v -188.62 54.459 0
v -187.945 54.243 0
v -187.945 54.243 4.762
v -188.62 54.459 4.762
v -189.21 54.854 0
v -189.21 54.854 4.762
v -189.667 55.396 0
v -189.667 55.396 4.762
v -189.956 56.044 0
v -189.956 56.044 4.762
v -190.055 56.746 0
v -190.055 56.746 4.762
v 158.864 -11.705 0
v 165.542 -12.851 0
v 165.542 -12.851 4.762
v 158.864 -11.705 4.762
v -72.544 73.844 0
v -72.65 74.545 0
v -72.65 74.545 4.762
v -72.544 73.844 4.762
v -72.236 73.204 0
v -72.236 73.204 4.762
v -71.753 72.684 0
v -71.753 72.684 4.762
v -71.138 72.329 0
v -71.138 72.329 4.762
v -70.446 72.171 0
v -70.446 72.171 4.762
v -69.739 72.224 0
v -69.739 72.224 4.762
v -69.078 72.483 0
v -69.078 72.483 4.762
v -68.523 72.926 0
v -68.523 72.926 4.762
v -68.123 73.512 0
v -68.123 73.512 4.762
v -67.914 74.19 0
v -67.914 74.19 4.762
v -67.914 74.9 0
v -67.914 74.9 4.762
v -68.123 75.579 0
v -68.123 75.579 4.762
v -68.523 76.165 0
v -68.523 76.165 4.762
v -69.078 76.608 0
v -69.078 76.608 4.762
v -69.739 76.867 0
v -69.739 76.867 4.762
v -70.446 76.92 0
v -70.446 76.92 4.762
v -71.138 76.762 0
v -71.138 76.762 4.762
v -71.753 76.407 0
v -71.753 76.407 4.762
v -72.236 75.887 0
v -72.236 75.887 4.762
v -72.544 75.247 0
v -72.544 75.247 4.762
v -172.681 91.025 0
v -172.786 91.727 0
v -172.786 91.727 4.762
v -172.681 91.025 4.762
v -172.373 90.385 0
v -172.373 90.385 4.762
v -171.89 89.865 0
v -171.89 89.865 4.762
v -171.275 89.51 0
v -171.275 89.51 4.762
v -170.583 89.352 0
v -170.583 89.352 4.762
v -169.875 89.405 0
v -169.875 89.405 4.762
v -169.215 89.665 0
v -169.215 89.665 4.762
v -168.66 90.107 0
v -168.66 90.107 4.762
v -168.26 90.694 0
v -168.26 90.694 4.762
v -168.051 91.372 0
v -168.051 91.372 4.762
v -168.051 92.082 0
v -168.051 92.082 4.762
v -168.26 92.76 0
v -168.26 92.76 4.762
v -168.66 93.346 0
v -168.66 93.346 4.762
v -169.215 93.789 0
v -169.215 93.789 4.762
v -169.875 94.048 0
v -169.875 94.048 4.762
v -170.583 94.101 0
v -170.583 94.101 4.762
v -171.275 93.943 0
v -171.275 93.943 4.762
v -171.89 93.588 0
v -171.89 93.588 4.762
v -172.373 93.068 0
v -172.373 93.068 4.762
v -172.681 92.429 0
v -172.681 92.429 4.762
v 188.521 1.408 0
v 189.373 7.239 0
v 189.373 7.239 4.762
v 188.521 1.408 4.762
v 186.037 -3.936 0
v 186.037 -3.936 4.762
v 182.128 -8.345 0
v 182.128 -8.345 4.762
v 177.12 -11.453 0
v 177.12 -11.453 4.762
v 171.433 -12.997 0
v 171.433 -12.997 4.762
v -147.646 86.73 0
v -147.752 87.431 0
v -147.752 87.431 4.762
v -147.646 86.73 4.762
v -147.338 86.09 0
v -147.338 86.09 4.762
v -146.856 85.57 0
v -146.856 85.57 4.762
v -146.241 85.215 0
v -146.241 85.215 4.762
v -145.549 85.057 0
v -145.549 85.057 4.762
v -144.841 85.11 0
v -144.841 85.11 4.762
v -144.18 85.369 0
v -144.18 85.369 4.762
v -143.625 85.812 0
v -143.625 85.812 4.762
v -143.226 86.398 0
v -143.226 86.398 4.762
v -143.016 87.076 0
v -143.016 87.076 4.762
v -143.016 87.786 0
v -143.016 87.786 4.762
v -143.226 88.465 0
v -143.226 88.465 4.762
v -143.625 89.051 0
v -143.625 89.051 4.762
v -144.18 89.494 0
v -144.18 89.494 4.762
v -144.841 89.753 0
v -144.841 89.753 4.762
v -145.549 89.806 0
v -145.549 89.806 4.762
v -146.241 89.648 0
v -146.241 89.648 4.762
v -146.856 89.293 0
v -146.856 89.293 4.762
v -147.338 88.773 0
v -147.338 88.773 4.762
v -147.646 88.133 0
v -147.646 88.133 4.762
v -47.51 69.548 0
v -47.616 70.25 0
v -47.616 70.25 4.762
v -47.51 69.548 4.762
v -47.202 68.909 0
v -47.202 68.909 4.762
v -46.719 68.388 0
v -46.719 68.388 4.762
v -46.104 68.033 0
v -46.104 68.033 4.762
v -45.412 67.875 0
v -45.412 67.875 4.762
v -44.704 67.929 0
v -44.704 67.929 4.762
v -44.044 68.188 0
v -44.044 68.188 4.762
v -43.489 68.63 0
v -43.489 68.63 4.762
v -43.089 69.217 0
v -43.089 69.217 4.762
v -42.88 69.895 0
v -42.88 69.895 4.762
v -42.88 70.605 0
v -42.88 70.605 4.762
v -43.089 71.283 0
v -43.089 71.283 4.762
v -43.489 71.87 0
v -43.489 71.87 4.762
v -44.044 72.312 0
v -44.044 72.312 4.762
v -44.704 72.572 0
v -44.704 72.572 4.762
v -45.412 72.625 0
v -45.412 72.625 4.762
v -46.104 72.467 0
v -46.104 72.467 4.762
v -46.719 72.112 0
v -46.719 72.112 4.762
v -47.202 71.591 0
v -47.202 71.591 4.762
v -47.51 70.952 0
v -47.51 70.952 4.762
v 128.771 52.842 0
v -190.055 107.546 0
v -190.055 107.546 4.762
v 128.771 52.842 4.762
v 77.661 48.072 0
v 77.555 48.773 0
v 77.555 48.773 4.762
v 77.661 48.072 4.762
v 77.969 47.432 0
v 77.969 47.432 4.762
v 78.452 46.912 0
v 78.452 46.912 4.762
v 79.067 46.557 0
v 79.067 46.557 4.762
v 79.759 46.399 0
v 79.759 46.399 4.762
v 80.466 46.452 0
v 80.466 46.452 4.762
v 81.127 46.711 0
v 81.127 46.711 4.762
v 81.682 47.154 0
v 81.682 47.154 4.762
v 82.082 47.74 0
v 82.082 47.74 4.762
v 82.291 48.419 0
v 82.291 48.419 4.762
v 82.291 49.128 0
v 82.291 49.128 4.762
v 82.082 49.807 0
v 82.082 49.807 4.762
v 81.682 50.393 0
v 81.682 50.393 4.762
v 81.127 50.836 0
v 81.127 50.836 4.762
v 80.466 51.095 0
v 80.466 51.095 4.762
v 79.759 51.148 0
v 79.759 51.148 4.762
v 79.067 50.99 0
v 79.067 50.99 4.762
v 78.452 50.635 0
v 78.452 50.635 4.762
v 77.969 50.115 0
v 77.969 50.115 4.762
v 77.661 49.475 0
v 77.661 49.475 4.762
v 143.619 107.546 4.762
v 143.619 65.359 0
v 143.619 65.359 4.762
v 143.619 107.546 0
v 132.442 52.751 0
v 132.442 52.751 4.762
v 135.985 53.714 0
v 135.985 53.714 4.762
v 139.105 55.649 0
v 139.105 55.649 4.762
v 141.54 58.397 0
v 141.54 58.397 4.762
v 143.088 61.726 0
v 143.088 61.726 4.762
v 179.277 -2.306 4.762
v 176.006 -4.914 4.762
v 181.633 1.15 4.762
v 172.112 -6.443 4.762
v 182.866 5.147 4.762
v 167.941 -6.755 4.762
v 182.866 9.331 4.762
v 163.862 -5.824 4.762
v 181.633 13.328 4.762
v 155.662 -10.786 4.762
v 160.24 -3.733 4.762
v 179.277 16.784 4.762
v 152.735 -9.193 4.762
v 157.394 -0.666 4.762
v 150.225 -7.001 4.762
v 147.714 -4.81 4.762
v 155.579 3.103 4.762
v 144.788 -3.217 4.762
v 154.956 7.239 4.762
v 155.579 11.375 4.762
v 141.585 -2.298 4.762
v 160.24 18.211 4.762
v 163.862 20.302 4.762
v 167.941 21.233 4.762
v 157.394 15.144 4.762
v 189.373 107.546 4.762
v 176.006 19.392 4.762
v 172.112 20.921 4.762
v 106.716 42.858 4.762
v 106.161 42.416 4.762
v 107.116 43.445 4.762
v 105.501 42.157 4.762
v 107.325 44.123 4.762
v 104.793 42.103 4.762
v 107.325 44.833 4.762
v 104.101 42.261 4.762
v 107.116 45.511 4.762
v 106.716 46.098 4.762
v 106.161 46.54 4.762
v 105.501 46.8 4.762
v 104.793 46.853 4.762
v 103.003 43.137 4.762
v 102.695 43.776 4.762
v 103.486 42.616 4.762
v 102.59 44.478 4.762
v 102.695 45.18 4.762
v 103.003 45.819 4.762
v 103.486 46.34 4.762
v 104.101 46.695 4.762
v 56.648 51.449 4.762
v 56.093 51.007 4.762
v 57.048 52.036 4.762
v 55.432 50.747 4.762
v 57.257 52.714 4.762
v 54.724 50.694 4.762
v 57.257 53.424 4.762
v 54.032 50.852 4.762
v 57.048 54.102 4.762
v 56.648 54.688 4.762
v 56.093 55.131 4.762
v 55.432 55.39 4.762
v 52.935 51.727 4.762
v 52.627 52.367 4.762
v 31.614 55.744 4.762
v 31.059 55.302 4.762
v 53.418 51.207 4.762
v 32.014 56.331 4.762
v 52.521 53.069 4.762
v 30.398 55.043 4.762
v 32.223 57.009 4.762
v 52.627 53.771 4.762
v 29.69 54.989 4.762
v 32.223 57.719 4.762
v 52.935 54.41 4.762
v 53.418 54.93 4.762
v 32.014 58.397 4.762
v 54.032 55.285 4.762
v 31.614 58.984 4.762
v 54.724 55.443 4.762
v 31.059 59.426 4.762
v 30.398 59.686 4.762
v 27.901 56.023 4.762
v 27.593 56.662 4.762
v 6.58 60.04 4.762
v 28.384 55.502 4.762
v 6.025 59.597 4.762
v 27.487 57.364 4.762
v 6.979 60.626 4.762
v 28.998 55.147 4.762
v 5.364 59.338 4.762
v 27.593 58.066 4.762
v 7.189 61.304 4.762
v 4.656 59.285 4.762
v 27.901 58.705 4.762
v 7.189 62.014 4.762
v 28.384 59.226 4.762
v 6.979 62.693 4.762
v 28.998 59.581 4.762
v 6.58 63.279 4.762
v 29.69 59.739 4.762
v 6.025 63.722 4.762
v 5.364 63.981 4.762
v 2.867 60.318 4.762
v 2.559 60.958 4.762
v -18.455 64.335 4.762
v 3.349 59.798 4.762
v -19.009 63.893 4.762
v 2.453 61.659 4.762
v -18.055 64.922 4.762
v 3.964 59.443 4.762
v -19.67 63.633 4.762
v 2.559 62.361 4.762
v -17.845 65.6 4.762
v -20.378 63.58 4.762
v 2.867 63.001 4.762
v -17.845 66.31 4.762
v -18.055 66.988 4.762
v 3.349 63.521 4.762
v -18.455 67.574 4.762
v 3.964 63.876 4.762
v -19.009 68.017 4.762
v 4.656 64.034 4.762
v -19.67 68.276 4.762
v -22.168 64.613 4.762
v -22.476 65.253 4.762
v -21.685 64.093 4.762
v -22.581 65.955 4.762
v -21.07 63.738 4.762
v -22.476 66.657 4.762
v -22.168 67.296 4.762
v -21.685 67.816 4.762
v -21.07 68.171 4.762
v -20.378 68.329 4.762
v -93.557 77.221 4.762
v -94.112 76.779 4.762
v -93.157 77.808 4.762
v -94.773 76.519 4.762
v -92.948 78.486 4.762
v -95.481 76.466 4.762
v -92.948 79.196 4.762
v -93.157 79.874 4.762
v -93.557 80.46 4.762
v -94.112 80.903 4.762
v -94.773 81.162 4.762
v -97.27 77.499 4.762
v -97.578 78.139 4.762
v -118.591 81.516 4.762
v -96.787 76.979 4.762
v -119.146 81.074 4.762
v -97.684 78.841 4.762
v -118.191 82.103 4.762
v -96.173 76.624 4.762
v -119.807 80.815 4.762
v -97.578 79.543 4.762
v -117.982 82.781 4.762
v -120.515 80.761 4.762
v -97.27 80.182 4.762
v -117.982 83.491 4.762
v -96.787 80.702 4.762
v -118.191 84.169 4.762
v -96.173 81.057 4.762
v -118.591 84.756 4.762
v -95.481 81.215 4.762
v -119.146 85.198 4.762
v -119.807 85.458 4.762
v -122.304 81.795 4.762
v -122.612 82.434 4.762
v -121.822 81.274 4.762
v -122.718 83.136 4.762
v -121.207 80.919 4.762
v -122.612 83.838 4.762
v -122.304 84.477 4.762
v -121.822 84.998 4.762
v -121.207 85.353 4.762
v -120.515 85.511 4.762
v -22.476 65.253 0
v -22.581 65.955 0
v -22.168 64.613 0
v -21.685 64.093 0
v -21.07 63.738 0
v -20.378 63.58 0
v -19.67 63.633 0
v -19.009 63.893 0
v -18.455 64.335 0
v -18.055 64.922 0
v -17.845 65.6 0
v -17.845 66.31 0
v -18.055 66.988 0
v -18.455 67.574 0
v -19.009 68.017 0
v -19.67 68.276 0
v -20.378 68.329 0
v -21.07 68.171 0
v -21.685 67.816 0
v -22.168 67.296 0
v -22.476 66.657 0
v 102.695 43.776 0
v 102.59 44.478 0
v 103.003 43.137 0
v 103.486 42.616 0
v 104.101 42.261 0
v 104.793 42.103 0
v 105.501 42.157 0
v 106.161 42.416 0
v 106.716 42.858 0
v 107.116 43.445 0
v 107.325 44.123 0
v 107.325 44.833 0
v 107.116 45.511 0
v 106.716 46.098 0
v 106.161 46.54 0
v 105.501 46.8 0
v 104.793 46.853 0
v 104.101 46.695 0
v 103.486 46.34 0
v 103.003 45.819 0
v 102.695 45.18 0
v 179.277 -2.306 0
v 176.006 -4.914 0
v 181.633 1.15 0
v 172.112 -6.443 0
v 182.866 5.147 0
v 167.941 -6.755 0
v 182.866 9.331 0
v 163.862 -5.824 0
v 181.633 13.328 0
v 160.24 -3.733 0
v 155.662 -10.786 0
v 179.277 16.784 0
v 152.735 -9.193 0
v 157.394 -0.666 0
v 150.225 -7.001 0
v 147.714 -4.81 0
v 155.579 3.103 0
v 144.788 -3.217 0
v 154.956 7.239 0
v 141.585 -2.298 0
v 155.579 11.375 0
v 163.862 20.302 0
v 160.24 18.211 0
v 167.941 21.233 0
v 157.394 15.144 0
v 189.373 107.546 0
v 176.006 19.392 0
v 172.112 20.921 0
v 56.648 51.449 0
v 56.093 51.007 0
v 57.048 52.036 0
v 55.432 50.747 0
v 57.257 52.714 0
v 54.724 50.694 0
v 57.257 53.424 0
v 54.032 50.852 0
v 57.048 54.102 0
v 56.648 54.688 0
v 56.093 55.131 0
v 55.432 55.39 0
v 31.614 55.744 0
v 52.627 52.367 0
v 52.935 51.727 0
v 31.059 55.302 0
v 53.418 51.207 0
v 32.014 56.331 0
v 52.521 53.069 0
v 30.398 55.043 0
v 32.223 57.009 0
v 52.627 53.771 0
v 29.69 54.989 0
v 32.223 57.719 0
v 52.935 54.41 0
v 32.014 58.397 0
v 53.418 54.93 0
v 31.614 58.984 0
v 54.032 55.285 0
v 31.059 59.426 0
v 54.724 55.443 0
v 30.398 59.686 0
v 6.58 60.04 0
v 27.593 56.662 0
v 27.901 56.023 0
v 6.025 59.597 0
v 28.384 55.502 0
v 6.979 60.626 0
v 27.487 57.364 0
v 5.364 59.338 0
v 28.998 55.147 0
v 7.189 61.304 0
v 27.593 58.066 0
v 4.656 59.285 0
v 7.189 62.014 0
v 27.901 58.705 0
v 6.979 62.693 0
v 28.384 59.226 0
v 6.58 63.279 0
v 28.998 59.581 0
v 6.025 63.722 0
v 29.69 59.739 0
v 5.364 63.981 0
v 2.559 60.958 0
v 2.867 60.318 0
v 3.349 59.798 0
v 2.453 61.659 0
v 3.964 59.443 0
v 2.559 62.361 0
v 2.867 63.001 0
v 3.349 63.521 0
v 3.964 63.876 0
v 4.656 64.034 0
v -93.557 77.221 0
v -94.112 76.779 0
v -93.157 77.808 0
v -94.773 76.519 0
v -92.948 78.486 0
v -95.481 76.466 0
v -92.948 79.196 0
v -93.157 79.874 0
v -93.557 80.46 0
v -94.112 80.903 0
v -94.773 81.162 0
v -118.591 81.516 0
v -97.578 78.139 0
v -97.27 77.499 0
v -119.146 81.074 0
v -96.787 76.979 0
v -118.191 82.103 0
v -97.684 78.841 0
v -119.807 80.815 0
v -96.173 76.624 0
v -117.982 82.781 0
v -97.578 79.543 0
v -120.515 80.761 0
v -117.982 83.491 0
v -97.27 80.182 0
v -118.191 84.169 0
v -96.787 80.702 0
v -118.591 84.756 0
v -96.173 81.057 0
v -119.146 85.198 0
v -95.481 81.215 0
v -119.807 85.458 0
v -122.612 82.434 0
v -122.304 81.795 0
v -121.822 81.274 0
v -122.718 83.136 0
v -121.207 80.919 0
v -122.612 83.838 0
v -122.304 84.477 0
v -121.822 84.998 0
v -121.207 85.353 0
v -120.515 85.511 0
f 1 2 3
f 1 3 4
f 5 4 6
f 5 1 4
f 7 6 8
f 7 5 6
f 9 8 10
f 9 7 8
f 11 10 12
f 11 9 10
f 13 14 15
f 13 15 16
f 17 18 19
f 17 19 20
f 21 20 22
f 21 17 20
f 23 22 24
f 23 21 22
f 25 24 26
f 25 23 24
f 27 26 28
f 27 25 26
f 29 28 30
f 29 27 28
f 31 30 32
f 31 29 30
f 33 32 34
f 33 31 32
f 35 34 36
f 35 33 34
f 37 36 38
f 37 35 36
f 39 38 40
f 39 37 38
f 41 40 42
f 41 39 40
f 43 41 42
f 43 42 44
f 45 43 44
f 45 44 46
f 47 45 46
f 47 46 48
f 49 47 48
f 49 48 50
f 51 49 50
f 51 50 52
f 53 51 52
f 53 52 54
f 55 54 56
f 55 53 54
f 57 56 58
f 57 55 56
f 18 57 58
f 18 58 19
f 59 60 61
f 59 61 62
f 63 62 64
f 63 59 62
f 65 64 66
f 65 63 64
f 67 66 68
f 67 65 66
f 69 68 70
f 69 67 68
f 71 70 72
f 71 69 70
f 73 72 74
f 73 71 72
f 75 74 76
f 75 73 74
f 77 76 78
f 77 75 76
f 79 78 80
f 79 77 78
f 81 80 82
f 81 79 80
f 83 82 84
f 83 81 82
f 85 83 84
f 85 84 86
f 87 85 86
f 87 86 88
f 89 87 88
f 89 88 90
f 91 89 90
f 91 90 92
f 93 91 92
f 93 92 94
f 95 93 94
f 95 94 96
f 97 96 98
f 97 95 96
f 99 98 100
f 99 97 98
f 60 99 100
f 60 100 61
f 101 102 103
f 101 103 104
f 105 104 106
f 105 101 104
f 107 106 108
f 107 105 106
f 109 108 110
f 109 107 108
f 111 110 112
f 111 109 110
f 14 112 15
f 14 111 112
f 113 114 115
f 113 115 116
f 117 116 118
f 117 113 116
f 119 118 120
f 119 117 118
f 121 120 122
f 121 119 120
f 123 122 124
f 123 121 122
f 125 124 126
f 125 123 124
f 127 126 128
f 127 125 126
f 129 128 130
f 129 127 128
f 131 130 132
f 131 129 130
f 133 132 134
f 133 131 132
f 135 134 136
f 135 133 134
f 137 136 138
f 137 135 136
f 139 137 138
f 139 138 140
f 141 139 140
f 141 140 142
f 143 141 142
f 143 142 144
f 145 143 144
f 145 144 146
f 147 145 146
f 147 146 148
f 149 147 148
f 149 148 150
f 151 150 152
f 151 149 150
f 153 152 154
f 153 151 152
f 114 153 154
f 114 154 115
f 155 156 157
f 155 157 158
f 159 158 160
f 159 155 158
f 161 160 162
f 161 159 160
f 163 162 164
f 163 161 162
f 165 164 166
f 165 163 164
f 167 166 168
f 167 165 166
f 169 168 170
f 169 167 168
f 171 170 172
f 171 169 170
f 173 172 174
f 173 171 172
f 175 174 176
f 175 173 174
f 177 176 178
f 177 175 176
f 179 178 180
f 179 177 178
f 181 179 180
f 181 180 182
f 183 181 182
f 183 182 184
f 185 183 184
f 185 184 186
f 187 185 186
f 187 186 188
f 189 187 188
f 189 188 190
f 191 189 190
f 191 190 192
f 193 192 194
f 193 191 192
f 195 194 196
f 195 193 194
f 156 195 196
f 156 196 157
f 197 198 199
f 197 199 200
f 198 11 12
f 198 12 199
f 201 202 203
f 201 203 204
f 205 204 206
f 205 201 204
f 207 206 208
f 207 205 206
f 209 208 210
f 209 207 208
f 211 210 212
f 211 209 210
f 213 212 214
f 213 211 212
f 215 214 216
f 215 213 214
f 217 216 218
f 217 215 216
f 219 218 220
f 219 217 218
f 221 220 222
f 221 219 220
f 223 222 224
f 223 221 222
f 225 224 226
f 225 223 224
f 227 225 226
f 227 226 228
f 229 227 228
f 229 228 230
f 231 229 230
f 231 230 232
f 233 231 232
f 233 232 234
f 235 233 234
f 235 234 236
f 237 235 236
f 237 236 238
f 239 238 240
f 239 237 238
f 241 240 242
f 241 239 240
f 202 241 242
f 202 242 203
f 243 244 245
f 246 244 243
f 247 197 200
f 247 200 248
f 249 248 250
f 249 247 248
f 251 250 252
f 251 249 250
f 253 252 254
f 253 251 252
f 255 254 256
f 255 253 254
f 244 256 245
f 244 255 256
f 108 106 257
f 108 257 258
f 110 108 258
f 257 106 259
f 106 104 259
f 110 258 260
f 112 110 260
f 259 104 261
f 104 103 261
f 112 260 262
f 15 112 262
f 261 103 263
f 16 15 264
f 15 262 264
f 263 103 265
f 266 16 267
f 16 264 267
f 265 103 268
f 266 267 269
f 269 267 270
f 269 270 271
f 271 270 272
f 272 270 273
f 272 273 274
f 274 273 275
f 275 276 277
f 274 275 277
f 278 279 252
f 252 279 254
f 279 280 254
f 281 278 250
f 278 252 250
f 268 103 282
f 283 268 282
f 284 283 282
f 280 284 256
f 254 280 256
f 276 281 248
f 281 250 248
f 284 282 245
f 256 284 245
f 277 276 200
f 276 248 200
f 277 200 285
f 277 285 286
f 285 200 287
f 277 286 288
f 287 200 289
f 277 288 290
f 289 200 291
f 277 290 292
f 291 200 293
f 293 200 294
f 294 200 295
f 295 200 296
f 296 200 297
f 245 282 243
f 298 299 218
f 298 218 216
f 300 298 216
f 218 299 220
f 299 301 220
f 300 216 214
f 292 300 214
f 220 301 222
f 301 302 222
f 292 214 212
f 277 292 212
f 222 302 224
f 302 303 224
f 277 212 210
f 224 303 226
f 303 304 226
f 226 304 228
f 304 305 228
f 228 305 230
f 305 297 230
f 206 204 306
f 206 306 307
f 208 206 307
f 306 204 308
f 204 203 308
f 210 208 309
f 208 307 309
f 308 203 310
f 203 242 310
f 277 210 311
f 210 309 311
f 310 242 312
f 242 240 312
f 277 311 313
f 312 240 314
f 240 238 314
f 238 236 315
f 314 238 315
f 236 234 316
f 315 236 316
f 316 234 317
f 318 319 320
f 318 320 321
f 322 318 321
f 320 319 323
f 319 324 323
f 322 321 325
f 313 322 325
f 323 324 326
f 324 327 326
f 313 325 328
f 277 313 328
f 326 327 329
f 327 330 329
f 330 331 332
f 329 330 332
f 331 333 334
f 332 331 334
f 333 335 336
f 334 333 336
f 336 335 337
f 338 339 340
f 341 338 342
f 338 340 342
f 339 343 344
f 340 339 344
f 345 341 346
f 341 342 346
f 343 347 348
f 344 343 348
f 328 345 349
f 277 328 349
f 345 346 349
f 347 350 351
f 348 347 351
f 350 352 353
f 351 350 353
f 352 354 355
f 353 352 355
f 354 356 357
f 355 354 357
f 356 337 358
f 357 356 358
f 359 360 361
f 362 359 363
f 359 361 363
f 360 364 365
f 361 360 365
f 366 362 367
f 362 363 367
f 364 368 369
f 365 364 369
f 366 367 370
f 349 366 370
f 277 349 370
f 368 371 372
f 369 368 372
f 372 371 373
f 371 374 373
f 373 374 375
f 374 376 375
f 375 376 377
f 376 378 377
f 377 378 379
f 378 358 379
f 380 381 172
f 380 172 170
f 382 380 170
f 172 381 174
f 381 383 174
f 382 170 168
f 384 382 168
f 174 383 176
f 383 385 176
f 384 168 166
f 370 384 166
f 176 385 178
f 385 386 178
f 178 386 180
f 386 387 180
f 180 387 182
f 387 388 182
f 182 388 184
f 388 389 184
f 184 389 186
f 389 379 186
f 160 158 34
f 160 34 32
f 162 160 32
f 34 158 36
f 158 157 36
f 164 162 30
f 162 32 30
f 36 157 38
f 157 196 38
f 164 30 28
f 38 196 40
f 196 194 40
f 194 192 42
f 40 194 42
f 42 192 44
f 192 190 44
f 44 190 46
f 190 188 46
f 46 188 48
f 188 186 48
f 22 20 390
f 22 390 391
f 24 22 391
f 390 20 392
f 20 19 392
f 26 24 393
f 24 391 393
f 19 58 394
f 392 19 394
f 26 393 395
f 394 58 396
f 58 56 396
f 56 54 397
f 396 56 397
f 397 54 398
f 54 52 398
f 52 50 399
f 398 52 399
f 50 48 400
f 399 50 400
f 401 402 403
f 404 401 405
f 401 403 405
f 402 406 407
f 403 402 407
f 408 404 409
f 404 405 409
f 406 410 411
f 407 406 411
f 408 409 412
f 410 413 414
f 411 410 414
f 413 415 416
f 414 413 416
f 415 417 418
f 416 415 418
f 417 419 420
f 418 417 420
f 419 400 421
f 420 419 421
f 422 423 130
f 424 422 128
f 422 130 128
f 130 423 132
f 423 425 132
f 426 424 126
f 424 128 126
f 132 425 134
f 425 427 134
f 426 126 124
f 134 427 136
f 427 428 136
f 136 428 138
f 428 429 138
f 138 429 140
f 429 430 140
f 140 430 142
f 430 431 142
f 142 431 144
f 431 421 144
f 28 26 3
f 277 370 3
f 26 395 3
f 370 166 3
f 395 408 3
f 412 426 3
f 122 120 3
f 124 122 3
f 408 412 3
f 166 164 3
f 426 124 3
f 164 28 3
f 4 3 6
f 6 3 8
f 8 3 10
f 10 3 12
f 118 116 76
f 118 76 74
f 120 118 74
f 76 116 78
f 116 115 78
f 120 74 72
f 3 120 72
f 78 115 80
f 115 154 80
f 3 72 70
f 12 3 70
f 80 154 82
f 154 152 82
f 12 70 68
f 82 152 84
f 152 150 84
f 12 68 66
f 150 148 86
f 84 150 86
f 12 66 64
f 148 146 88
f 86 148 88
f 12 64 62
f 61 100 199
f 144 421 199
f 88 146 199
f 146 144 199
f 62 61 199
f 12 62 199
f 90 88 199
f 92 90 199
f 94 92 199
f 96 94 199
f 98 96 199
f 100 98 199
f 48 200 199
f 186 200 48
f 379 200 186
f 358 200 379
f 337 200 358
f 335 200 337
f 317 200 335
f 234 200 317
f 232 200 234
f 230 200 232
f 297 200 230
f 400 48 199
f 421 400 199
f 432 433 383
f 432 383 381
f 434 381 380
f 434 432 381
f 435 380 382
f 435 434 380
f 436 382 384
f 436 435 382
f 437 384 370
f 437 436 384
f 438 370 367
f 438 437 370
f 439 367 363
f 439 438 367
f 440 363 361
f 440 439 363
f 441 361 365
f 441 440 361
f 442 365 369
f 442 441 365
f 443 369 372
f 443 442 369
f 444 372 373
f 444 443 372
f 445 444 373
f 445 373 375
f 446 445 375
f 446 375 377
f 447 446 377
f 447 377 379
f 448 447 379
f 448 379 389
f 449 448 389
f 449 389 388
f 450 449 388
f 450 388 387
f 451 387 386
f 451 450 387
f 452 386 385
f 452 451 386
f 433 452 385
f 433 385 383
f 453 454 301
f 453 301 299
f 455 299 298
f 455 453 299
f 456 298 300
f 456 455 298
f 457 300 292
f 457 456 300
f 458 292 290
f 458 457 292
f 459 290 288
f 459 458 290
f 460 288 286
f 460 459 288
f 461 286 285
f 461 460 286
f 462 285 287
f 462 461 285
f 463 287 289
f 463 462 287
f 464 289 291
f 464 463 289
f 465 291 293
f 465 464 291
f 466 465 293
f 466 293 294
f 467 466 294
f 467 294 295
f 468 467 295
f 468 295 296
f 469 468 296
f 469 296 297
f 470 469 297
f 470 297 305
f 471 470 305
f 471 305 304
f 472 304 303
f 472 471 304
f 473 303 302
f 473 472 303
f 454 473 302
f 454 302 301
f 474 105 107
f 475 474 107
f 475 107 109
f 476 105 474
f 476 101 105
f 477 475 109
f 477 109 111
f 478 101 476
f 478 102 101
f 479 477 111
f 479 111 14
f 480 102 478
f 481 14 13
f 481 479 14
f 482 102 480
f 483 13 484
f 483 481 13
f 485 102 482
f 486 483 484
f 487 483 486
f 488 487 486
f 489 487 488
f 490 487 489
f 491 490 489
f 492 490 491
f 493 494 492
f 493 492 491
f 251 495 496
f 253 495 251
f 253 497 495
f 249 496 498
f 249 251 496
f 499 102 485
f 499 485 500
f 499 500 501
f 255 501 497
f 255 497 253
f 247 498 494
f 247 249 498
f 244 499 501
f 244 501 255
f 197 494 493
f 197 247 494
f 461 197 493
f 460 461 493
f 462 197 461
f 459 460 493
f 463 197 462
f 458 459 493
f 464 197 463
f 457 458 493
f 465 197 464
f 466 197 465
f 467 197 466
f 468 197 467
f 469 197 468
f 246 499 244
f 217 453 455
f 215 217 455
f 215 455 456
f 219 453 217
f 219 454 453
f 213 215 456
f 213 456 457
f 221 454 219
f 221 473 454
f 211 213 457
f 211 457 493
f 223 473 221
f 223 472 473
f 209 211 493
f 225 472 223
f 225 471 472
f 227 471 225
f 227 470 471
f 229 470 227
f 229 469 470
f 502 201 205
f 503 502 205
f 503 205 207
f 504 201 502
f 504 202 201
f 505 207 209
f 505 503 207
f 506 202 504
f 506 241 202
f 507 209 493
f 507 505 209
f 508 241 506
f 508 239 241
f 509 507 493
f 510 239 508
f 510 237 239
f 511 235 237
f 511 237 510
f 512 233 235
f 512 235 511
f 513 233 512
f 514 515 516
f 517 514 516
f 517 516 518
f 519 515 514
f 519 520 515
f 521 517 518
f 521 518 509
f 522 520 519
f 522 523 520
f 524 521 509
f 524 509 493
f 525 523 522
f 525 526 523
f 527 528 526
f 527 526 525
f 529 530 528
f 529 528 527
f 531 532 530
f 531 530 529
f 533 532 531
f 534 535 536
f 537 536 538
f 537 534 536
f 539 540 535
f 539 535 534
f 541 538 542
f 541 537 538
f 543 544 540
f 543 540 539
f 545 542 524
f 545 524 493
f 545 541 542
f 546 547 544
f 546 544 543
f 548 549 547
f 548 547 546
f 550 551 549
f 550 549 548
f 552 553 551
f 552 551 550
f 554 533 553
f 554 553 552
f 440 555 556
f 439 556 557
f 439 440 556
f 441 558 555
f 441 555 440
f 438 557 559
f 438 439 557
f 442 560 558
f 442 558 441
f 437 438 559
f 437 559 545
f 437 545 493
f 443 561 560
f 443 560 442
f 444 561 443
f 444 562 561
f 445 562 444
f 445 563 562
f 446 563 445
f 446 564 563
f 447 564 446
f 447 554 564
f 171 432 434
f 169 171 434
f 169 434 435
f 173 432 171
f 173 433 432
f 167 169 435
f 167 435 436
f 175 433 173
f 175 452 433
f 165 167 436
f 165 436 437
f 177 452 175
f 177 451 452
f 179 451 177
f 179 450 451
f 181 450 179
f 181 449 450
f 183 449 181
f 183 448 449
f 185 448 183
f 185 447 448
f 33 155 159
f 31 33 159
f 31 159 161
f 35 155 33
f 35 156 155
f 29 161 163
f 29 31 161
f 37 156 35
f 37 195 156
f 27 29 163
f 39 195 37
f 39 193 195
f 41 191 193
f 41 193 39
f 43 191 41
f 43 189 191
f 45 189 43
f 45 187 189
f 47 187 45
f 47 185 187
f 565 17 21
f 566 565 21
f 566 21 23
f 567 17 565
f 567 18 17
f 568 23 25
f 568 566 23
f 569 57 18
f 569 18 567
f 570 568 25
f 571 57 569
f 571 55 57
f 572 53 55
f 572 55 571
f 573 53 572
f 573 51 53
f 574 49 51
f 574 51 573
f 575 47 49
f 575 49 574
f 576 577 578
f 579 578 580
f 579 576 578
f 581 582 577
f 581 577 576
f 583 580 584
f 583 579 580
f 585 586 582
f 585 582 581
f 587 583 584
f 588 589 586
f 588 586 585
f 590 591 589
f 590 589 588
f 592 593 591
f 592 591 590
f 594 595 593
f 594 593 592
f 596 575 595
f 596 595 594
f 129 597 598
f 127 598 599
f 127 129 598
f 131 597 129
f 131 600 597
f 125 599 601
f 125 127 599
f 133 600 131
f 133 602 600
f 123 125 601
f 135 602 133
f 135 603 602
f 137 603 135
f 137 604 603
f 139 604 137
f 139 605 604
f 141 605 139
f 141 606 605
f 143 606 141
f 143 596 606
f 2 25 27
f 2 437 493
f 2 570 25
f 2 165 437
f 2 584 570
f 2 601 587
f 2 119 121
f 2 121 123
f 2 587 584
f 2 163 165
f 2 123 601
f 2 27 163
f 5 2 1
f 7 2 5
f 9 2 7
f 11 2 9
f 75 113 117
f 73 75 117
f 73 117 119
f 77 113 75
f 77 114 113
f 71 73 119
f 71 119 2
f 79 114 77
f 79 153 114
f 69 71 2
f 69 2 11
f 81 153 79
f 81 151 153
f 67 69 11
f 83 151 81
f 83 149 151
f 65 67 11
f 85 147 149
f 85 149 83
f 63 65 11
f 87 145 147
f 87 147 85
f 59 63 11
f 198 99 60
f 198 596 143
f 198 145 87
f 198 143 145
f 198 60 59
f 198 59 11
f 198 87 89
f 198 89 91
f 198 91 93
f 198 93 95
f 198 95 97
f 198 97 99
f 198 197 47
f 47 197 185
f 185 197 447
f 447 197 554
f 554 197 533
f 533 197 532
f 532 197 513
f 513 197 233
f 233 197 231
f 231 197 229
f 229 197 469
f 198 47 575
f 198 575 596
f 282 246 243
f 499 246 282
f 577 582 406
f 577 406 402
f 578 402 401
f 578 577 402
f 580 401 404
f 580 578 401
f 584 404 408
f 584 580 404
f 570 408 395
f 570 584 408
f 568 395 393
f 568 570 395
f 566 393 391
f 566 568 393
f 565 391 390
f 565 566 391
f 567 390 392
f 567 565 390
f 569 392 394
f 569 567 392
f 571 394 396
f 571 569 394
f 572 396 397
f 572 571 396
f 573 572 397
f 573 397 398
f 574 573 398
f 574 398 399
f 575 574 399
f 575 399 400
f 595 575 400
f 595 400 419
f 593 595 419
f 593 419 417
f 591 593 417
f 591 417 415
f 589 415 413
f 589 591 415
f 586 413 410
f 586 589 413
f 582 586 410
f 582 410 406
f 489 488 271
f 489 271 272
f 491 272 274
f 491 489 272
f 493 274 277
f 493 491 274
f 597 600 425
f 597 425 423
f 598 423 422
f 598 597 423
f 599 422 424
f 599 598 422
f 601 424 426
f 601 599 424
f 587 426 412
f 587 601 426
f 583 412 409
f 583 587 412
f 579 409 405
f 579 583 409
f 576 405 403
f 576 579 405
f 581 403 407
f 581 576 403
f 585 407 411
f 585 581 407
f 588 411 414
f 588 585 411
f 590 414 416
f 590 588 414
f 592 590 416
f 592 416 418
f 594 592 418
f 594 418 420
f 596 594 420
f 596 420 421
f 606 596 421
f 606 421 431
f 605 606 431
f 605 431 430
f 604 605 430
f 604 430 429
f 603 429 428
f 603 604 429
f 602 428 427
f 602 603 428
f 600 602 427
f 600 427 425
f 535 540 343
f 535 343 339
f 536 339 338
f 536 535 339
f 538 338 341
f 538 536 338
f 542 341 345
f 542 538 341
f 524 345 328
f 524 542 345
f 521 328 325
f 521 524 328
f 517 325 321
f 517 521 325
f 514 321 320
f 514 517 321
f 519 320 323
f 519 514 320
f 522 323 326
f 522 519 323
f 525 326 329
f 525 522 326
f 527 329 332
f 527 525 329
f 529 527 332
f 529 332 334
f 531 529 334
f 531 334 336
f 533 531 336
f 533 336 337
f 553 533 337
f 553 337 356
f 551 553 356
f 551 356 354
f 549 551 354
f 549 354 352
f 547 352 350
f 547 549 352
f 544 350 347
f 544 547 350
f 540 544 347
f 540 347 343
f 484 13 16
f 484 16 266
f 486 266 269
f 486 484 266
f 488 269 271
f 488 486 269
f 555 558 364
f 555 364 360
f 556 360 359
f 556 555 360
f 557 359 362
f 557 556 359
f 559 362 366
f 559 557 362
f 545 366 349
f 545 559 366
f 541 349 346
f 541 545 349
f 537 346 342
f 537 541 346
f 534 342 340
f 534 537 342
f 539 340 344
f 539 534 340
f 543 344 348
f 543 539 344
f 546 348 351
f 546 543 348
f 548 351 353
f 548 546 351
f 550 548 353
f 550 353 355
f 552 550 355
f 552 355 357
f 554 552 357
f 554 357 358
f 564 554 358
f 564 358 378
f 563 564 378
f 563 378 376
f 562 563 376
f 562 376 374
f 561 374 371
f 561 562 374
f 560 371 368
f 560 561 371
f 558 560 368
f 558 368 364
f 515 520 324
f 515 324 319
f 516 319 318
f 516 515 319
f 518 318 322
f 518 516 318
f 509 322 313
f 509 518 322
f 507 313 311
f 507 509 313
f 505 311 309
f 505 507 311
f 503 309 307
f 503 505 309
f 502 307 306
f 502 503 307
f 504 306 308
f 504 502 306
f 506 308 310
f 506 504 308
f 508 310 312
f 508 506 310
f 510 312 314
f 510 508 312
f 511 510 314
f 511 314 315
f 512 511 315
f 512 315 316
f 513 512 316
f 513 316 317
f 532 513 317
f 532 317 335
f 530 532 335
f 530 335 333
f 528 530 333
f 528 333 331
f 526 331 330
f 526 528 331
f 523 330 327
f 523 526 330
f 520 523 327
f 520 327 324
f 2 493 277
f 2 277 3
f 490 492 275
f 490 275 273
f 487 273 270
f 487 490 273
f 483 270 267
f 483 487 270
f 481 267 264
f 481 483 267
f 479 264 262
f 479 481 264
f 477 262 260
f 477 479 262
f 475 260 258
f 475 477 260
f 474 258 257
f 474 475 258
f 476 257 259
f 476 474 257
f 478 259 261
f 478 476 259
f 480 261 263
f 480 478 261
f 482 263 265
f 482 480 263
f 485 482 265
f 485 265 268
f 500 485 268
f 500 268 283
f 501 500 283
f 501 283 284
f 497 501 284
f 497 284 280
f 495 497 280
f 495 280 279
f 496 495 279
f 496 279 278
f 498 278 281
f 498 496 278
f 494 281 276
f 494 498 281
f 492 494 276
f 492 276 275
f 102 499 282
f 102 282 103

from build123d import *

# Parameters (mm, degrees)
SKETCH1_R           = 14.0335
SKETCH1_R_2         = 2.38125
BOSS_EXTRUDE1_DEPTH = 4.7625
CUT_EXTRUDE1_DEPTH  = 219.425881909


with BuildPart() as part:
    # Sketch1 → Boss-Extrude1 (new body)
    with BuildSketch(Plane.XY):
        with BuildLine():
            Line((165.542350471, -12.850928795), (158.864493489, -11.70515089))
            ThreePointArc((158.864493489, -11.70515089), (154.154566121, -10.06953751), (150.224583517, -7.001332225))
            ThreePointArc((150.224583517, -7.001332225), (146.294597206, -3.933124046), (141.584665397, -2.297509122))
            Line((141.584665397, -2.297509122), (-187.944818486, 54.242725653))
            ThreePointArc((-187.944818486, 54.242725653), (-189.457270687, 55.108983561), (-190.055285337, 56.746143572))
            Line((-190.055285337, 56.746143572), (-190.055285337, 107.546143572))
            Line((-190.055285337, 107.546143572), (128.771239178, 52.842308466))
            ThreePointArc((128.771239178, 52.842308466), (139.104704977, 55.649471309), (143.618904922, 65.359398058))
            Line((143.618904922, 65.359398058), (143.618904922, 107.546143572))
            Line((143.618904922, 107.546143572), (189.37285399, 107.546143572))
            Line((189.37285399, 107.546143572), (189.37285399, 7.239))
            ThreePointArc((189.37285399, 7.239), (182.127563077, -8.345432433), (165.542350471, -12.850928795))
        make_face()
        with Locations(Location((168.98935399, 7.239, 0), (0, 0, 180))):
            Circle(SKETCH1_R, mode=Mode.SUBTRACT)
        with Locations(Location((104.970773751, 44.478080628, 0), (0, 0, 180))):
            Circle(SKETCH1_R_2, mode=Mode.SUBTRACT)
        with Locations(Location((79.936594567, 48.773412116, 0), (0, 0, 180))):
            Circle(SKETCH1_R_2, mode=Mode.SUBTRACT)
        with Locations(Location((54.902415383, 53.068743605, 0), (0, 0, 180))):
            Circle(SKETCH1_R_2, mode=Mode.SUBTRACT)
        with Locations(Location((29.868236199, 57.364075093, 0), (0, 0, 180))):
            Circle(SKETCH1_R_2, mode=Mode.SUBTRACT)
        with Locations(Location((4.834057015, 61.659406581, 0), (0, 0, 180))):
            Circle(SKETCH1_R_2, mode=Mode.SUBTRACT)
        with Locations(Location((-20.200122168, 65.95473807, 0), (0, 0, 180))):
            Circle(SKETCH1_R_2, mode=Mode.SUBTRACT)
        with Locations(Location((-45.234301352, 70.250069558, 0), (0, 0, 180))):
            Circle(SKETCH1_R_2, mode=Mode.SUBTRACT)
        with Locations(Location((-70.268480536, 74.545401047, 0), (0, 0, 180))):
            Circle(SKETCH1_R_2, mode=Mode.SUBTRACT)
        with Locations(Location((-170.405197271, 91.726727, 0), (0, 0, 180))):
            Circle(SKETCH1_R_2, mode=Mode.SUBTRACT)
        with Locations(Location((-145.371018087, 87.431395512, 0), (0, 0, 180))):
            Circle(SKETCH1_R_2, mode=Mode.SUBTRACT)
        with Locations(Location((-120.336838903, 83.136064023, 0), (0, 0, 180))):
            Circle(SKETCH1_R_2, mode=Mode.SUBTRACT)
        with Locations(Location((-95.30265972, 78.840732535, 0), (0, 0, 180))):
            Circle(SKETCH1_R_2, mode=Mode.SUBTRACT)
    extrude(amount=BOSS_EXTRUDE1_DEPTH)

    # Sketch3 → Cut-Extrude1 (cut, through all)
    with BuildSketch(Plane.XY.offset(4.7625)):
        with BuildLine():
            Line((125.87285399, 333.30748602), (115.993328583, 323.427960612))
            ThreePointArc((115.993328583, 323.427960612), (112.023332702, 320.973988275), (107.375068785, 320.553881036))
            Line((107.375068785, 320.553881036), (17.92285399, 333.30748602))
            Line((17.92285399, 333.30748602), (125.87285399, 333.30748602))
        make_face()
    extrude(amount=-CUT_EXTRUDE1_DEPTH, mode=Mode.SUBTRACT)


solid = part.part
